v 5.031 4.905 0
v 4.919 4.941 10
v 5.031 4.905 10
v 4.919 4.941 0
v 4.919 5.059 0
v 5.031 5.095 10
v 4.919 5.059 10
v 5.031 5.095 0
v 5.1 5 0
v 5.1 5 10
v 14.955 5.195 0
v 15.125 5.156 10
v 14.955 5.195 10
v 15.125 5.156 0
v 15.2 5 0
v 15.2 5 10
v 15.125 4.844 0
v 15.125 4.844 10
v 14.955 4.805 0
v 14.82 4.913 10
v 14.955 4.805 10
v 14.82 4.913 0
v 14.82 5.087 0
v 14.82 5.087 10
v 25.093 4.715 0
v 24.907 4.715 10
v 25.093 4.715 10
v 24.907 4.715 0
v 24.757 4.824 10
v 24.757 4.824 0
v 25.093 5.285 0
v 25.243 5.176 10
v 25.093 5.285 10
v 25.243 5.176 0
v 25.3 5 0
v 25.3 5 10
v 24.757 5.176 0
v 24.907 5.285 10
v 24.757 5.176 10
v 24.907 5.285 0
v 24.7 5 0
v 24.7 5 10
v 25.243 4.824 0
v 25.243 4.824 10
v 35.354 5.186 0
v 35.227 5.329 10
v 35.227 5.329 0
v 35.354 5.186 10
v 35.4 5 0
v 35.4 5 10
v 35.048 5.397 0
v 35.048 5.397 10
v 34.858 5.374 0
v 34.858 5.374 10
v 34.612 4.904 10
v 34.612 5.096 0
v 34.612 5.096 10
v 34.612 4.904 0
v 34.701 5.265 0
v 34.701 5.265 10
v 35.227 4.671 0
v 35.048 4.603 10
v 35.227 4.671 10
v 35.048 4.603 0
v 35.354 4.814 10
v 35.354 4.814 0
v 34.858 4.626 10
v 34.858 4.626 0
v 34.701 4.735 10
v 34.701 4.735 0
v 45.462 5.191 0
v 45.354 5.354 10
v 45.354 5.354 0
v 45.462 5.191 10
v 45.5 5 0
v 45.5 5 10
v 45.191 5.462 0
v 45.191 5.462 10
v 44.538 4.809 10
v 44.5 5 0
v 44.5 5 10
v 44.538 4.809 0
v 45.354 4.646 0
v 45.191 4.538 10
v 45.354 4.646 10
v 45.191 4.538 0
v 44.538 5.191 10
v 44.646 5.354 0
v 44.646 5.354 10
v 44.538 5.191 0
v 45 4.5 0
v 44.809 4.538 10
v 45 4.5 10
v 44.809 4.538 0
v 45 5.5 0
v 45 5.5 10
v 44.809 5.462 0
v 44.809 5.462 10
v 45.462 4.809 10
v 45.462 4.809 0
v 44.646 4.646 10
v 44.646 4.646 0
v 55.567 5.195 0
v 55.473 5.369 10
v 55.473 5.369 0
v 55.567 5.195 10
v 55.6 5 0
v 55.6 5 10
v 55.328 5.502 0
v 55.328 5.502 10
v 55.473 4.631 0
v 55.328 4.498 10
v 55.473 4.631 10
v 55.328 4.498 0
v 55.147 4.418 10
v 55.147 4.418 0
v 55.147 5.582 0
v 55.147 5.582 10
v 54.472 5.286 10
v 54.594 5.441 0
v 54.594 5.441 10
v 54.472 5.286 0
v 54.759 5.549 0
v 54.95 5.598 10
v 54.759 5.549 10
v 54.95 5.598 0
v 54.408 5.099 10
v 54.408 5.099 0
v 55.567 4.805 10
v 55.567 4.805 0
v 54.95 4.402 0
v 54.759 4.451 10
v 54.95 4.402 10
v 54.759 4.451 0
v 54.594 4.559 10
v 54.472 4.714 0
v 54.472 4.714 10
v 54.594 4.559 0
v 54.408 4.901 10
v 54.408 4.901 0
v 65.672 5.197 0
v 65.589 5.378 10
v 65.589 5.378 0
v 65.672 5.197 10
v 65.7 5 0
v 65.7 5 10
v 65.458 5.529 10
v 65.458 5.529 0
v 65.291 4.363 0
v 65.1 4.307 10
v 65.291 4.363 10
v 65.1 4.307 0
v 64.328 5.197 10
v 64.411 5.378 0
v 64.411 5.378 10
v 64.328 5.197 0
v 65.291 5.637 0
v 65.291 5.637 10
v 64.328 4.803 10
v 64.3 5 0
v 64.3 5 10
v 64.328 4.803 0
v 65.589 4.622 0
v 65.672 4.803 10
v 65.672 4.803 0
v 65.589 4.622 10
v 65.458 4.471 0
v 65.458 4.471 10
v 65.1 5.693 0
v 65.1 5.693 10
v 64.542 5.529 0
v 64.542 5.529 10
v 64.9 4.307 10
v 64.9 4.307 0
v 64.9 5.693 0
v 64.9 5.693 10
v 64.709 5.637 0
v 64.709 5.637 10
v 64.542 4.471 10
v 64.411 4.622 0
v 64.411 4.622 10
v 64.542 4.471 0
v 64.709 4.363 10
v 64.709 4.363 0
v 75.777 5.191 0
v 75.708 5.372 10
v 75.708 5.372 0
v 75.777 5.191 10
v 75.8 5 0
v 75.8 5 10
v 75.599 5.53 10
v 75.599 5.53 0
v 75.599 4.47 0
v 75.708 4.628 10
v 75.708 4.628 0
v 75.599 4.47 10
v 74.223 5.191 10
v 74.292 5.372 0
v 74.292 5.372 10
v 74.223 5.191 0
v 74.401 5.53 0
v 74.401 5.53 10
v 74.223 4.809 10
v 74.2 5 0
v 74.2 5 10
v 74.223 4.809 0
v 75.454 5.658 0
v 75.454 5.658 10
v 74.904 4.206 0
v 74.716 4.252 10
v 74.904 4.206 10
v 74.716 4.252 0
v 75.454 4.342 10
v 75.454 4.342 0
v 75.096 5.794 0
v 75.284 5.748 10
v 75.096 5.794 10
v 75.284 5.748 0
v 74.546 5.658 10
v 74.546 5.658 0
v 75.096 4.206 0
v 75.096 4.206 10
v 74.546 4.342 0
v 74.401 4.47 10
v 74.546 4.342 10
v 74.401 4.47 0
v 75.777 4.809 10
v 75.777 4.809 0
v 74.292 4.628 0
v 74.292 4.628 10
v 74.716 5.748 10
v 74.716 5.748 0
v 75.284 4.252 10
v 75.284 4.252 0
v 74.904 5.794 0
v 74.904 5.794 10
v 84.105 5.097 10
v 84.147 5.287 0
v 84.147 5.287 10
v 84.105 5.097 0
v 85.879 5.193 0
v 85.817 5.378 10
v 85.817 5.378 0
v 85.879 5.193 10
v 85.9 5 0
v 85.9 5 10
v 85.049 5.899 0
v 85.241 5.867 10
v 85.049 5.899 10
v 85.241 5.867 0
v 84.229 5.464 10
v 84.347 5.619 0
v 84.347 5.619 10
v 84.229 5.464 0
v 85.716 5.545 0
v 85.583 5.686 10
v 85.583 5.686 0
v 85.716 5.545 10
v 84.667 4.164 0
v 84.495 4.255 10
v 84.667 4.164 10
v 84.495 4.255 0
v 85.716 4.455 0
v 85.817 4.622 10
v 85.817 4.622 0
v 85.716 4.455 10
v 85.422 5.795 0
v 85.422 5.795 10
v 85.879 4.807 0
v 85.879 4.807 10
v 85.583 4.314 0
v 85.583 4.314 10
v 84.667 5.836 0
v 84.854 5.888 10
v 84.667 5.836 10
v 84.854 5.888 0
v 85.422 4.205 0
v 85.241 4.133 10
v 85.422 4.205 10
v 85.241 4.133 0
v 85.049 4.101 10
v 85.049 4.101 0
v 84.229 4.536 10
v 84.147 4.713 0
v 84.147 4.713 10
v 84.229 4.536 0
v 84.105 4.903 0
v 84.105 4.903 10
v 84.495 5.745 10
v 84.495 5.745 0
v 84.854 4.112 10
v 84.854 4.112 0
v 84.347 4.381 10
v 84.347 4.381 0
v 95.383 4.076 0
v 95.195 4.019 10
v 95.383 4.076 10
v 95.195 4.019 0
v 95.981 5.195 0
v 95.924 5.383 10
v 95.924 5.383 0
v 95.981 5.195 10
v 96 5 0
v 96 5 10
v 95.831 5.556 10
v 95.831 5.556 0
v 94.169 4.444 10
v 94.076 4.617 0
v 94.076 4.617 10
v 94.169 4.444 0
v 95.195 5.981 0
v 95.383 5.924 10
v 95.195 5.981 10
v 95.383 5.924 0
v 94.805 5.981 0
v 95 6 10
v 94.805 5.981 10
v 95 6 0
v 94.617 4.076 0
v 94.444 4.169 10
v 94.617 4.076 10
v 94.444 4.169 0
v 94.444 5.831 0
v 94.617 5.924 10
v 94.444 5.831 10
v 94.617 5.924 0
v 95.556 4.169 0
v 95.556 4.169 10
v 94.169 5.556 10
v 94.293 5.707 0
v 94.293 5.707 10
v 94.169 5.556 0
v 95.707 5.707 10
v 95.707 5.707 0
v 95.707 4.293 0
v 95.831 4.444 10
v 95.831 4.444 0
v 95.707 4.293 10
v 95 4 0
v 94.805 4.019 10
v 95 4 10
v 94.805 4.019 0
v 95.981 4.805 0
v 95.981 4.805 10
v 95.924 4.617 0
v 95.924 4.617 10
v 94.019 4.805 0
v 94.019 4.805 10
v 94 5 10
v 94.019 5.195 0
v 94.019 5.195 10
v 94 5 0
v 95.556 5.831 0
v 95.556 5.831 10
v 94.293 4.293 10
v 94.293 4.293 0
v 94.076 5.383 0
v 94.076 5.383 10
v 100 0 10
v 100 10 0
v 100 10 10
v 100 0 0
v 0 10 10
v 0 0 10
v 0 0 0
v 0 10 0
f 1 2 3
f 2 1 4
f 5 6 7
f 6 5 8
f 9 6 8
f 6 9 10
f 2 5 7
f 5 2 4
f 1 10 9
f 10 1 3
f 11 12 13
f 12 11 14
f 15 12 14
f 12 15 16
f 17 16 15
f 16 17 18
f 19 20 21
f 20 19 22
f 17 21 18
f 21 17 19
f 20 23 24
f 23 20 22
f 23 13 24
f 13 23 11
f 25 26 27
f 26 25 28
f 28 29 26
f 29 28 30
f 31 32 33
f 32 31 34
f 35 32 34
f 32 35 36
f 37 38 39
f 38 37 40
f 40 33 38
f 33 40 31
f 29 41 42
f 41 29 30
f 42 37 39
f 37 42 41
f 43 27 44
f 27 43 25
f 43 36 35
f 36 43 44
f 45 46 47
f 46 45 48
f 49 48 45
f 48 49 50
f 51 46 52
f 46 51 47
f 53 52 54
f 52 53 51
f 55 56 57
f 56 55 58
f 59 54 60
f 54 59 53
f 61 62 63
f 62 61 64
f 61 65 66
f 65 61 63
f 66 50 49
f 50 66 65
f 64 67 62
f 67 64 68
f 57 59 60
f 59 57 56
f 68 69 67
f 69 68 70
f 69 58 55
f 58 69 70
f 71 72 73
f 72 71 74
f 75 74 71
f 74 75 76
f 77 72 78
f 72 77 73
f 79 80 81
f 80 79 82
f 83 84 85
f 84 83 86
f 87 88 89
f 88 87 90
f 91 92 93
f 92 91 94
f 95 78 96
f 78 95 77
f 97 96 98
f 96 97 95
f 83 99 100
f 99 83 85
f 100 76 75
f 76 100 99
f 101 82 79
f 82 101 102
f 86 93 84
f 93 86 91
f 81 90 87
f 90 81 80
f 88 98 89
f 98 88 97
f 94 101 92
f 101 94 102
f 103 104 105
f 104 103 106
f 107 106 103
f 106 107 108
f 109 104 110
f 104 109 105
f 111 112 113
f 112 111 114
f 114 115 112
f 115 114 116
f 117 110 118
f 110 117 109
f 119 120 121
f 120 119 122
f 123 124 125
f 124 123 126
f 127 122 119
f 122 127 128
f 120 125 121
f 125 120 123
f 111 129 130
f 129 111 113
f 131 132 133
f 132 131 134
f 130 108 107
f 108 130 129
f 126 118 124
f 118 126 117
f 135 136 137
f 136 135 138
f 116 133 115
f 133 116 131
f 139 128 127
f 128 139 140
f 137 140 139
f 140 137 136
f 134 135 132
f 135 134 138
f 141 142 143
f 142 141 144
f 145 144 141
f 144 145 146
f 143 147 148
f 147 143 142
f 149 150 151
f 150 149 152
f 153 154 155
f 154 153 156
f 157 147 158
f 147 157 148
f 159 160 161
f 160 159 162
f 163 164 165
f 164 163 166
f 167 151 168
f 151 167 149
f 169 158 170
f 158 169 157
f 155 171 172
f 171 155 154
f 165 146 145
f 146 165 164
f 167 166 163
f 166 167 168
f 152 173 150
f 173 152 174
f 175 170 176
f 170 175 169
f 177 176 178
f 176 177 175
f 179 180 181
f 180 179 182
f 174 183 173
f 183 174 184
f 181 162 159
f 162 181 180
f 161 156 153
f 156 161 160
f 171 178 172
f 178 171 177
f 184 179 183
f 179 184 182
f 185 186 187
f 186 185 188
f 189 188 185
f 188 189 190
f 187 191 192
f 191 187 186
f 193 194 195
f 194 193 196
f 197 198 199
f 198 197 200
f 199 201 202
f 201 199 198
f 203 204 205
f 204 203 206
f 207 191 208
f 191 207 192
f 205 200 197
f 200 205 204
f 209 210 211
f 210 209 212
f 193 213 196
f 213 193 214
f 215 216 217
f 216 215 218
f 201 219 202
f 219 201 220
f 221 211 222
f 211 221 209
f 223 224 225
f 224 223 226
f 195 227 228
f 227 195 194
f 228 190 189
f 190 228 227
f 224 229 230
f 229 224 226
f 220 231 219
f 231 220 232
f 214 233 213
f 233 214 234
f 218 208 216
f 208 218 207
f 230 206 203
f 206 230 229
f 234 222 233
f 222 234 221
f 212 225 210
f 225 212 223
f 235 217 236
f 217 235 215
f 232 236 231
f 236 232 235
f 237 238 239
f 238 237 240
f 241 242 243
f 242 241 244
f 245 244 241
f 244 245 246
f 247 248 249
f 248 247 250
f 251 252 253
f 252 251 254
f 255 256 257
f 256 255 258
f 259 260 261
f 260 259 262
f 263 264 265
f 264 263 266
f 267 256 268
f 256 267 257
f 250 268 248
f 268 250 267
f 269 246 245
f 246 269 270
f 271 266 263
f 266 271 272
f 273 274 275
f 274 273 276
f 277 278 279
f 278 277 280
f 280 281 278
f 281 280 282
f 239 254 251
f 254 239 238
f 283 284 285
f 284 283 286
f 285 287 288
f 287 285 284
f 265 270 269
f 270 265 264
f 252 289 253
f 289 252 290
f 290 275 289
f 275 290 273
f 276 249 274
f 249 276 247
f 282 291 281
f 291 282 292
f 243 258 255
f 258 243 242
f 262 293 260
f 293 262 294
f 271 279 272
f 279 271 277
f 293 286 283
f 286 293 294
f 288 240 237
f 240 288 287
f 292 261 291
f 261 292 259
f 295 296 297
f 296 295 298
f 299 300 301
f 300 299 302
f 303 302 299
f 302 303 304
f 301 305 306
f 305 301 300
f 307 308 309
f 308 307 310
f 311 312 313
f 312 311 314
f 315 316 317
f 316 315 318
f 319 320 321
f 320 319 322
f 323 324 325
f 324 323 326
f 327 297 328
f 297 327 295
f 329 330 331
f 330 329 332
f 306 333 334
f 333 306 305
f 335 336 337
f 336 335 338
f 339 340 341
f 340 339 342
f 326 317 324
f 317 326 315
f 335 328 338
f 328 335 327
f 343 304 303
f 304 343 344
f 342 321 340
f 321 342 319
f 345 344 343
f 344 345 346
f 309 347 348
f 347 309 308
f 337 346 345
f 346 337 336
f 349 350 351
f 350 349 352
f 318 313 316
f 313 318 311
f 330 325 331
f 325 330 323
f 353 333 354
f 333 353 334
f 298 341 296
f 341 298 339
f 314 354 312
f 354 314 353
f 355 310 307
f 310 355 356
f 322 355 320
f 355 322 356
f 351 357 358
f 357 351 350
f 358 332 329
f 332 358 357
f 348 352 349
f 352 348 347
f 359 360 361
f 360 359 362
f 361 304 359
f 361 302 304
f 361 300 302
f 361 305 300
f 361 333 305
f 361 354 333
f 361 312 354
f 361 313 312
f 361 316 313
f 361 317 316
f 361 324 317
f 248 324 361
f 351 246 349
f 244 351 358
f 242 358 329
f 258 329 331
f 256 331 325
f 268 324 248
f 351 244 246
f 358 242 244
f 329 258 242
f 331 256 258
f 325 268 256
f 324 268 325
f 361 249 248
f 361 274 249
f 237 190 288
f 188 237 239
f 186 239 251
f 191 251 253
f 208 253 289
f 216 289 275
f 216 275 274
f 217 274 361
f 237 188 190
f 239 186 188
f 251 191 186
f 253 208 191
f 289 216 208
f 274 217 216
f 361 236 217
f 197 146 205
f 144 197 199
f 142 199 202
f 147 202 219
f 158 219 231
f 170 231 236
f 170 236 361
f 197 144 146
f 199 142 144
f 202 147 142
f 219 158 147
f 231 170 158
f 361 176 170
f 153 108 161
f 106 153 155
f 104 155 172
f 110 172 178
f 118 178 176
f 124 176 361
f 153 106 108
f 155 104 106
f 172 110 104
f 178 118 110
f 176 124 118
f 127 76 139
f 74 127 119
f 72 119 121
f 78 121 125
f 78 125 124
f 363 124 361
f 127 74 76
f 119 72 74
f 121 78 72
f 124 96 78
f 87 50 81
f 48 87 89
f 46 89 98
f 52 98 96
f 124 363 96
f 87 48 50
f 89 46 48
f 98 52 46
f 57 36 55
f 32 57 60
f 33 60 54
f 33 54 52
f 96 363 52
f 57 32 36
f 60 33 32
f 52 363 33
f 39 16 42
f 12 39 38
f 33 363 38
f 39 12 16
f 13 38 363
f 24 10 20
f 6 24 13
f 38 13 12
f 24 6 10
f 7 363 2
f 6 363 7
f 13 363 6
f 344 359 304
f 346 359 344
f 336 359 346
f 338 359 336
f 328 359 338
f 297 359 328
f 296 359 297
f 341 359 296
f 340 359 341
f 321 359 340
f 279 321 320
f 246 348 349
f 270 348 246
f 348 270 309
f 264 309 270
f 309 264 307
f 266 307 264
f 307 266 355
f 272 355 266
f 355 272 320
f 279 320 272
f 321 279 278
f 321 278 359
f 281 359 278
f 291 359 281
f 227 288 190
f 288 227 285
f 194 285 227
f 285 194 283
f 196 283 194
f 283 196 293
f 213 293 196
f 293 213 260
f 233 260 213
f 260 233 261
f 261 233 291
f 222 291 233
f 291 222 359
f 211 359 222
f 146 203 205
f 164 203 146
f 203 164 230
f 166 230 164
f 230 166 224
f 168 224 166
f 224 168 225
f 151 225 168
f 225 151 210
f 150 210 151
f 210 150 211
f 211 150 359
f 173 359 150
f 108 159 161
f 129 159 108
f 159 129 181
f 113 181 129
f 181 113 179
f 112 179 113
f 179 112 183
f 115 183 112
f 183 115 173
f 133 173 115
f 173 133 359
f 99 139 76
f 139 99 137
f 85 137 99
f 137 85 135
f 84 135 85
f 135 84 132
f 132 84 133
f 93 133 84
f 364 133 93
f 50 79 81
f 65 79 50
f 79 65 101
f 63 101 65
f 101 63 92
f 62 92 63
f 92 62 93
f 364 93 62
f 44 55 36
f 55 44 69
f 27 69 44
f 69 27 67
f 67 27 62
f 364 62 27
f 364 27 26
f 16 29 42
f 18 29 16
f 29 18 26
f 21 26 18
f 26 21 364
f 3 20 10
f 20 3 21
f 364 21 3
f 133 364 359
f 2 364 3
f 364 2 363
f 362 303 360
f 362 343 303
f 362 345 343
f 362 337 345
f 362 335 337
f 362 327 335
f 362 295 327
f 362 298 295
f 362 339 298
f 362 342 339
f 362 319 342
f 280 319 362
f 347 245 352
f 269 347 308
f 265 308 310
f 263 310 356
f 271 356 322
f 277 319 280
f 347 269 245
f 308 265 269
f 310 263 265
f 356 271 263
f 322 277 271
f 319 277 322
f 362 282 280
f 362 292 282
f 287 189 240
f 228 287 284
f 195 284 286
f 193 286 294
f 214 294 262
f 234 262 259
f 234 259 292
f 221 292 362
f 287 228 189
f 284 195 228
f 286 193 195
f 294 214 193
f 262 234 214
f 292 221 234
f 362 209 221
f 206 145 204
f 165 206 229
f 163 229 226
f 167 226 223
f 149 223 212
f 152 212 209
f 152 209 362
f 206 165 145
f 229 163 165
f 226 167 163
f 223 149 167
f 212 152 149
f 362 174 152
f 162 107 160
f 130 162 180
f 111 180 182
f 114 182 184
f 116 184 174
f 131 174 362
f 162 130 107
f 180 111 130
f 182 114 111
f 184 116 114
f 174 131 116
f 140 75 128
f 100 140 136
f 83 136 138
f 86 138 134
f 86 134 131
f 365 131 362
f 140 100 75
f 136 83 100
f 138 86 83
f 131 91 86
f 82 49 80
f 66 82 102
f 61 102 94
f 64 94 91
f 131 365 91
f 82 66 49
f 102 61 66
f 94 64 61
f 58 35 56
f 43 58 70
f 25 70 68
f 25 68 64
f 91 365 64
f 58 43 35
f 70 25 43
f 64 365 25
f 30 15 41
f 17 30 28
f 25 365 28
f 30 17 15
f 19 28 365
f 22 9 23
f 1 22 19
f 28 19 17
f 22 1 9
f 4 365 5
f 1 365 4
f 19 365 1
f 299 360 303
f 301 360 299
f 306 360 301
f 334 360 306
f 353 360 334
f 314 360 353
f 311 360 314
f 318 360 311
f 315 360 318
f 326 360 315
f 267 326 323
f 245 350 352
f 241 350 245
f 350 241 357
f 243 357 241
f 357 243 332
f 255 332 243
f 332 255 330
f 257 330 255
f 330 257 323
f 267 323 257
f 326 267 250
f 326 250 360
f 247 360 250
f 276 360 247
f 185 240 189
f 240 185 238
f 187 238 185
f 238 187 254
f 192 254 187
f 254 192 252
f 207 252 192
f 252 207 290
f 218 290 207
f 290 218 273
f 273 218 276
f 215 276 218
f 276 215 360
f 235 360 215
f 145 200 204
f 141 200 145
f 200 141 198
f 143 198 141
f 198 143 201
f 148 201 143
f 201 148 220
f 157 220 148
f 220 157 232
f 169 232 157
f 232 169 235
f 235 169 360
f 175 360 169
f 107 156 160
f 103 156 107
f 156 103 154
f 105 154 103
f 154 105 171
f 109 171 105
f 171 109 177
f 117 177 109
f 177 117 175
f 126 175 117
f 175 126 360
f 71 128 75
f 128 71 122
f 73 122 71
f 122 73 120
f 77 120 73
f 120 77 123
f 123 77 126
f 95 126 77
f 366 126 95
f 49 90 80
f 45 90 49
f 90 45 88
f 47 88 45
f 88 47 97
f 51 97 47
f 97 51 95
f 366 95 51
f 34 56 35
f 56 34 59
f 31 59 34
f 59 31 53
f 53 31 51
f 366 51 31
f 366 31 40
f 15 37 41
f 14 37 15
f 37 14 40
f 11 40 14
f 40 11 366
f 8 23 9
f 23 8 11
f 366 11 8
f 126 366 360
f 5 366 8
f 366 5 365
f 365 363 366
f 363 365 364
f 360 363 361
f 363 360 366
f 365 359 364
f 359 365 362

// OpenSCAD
$fs = 0.2;
$fa = 1;

difference() {
	cube([100, 10, 10]);
	for(i = [0:9]) {
		translate([5 + i * 10, 5, -1]) {
			cylinder(r=(i + 1) * 0.1, h=12);
		}
	}
}
